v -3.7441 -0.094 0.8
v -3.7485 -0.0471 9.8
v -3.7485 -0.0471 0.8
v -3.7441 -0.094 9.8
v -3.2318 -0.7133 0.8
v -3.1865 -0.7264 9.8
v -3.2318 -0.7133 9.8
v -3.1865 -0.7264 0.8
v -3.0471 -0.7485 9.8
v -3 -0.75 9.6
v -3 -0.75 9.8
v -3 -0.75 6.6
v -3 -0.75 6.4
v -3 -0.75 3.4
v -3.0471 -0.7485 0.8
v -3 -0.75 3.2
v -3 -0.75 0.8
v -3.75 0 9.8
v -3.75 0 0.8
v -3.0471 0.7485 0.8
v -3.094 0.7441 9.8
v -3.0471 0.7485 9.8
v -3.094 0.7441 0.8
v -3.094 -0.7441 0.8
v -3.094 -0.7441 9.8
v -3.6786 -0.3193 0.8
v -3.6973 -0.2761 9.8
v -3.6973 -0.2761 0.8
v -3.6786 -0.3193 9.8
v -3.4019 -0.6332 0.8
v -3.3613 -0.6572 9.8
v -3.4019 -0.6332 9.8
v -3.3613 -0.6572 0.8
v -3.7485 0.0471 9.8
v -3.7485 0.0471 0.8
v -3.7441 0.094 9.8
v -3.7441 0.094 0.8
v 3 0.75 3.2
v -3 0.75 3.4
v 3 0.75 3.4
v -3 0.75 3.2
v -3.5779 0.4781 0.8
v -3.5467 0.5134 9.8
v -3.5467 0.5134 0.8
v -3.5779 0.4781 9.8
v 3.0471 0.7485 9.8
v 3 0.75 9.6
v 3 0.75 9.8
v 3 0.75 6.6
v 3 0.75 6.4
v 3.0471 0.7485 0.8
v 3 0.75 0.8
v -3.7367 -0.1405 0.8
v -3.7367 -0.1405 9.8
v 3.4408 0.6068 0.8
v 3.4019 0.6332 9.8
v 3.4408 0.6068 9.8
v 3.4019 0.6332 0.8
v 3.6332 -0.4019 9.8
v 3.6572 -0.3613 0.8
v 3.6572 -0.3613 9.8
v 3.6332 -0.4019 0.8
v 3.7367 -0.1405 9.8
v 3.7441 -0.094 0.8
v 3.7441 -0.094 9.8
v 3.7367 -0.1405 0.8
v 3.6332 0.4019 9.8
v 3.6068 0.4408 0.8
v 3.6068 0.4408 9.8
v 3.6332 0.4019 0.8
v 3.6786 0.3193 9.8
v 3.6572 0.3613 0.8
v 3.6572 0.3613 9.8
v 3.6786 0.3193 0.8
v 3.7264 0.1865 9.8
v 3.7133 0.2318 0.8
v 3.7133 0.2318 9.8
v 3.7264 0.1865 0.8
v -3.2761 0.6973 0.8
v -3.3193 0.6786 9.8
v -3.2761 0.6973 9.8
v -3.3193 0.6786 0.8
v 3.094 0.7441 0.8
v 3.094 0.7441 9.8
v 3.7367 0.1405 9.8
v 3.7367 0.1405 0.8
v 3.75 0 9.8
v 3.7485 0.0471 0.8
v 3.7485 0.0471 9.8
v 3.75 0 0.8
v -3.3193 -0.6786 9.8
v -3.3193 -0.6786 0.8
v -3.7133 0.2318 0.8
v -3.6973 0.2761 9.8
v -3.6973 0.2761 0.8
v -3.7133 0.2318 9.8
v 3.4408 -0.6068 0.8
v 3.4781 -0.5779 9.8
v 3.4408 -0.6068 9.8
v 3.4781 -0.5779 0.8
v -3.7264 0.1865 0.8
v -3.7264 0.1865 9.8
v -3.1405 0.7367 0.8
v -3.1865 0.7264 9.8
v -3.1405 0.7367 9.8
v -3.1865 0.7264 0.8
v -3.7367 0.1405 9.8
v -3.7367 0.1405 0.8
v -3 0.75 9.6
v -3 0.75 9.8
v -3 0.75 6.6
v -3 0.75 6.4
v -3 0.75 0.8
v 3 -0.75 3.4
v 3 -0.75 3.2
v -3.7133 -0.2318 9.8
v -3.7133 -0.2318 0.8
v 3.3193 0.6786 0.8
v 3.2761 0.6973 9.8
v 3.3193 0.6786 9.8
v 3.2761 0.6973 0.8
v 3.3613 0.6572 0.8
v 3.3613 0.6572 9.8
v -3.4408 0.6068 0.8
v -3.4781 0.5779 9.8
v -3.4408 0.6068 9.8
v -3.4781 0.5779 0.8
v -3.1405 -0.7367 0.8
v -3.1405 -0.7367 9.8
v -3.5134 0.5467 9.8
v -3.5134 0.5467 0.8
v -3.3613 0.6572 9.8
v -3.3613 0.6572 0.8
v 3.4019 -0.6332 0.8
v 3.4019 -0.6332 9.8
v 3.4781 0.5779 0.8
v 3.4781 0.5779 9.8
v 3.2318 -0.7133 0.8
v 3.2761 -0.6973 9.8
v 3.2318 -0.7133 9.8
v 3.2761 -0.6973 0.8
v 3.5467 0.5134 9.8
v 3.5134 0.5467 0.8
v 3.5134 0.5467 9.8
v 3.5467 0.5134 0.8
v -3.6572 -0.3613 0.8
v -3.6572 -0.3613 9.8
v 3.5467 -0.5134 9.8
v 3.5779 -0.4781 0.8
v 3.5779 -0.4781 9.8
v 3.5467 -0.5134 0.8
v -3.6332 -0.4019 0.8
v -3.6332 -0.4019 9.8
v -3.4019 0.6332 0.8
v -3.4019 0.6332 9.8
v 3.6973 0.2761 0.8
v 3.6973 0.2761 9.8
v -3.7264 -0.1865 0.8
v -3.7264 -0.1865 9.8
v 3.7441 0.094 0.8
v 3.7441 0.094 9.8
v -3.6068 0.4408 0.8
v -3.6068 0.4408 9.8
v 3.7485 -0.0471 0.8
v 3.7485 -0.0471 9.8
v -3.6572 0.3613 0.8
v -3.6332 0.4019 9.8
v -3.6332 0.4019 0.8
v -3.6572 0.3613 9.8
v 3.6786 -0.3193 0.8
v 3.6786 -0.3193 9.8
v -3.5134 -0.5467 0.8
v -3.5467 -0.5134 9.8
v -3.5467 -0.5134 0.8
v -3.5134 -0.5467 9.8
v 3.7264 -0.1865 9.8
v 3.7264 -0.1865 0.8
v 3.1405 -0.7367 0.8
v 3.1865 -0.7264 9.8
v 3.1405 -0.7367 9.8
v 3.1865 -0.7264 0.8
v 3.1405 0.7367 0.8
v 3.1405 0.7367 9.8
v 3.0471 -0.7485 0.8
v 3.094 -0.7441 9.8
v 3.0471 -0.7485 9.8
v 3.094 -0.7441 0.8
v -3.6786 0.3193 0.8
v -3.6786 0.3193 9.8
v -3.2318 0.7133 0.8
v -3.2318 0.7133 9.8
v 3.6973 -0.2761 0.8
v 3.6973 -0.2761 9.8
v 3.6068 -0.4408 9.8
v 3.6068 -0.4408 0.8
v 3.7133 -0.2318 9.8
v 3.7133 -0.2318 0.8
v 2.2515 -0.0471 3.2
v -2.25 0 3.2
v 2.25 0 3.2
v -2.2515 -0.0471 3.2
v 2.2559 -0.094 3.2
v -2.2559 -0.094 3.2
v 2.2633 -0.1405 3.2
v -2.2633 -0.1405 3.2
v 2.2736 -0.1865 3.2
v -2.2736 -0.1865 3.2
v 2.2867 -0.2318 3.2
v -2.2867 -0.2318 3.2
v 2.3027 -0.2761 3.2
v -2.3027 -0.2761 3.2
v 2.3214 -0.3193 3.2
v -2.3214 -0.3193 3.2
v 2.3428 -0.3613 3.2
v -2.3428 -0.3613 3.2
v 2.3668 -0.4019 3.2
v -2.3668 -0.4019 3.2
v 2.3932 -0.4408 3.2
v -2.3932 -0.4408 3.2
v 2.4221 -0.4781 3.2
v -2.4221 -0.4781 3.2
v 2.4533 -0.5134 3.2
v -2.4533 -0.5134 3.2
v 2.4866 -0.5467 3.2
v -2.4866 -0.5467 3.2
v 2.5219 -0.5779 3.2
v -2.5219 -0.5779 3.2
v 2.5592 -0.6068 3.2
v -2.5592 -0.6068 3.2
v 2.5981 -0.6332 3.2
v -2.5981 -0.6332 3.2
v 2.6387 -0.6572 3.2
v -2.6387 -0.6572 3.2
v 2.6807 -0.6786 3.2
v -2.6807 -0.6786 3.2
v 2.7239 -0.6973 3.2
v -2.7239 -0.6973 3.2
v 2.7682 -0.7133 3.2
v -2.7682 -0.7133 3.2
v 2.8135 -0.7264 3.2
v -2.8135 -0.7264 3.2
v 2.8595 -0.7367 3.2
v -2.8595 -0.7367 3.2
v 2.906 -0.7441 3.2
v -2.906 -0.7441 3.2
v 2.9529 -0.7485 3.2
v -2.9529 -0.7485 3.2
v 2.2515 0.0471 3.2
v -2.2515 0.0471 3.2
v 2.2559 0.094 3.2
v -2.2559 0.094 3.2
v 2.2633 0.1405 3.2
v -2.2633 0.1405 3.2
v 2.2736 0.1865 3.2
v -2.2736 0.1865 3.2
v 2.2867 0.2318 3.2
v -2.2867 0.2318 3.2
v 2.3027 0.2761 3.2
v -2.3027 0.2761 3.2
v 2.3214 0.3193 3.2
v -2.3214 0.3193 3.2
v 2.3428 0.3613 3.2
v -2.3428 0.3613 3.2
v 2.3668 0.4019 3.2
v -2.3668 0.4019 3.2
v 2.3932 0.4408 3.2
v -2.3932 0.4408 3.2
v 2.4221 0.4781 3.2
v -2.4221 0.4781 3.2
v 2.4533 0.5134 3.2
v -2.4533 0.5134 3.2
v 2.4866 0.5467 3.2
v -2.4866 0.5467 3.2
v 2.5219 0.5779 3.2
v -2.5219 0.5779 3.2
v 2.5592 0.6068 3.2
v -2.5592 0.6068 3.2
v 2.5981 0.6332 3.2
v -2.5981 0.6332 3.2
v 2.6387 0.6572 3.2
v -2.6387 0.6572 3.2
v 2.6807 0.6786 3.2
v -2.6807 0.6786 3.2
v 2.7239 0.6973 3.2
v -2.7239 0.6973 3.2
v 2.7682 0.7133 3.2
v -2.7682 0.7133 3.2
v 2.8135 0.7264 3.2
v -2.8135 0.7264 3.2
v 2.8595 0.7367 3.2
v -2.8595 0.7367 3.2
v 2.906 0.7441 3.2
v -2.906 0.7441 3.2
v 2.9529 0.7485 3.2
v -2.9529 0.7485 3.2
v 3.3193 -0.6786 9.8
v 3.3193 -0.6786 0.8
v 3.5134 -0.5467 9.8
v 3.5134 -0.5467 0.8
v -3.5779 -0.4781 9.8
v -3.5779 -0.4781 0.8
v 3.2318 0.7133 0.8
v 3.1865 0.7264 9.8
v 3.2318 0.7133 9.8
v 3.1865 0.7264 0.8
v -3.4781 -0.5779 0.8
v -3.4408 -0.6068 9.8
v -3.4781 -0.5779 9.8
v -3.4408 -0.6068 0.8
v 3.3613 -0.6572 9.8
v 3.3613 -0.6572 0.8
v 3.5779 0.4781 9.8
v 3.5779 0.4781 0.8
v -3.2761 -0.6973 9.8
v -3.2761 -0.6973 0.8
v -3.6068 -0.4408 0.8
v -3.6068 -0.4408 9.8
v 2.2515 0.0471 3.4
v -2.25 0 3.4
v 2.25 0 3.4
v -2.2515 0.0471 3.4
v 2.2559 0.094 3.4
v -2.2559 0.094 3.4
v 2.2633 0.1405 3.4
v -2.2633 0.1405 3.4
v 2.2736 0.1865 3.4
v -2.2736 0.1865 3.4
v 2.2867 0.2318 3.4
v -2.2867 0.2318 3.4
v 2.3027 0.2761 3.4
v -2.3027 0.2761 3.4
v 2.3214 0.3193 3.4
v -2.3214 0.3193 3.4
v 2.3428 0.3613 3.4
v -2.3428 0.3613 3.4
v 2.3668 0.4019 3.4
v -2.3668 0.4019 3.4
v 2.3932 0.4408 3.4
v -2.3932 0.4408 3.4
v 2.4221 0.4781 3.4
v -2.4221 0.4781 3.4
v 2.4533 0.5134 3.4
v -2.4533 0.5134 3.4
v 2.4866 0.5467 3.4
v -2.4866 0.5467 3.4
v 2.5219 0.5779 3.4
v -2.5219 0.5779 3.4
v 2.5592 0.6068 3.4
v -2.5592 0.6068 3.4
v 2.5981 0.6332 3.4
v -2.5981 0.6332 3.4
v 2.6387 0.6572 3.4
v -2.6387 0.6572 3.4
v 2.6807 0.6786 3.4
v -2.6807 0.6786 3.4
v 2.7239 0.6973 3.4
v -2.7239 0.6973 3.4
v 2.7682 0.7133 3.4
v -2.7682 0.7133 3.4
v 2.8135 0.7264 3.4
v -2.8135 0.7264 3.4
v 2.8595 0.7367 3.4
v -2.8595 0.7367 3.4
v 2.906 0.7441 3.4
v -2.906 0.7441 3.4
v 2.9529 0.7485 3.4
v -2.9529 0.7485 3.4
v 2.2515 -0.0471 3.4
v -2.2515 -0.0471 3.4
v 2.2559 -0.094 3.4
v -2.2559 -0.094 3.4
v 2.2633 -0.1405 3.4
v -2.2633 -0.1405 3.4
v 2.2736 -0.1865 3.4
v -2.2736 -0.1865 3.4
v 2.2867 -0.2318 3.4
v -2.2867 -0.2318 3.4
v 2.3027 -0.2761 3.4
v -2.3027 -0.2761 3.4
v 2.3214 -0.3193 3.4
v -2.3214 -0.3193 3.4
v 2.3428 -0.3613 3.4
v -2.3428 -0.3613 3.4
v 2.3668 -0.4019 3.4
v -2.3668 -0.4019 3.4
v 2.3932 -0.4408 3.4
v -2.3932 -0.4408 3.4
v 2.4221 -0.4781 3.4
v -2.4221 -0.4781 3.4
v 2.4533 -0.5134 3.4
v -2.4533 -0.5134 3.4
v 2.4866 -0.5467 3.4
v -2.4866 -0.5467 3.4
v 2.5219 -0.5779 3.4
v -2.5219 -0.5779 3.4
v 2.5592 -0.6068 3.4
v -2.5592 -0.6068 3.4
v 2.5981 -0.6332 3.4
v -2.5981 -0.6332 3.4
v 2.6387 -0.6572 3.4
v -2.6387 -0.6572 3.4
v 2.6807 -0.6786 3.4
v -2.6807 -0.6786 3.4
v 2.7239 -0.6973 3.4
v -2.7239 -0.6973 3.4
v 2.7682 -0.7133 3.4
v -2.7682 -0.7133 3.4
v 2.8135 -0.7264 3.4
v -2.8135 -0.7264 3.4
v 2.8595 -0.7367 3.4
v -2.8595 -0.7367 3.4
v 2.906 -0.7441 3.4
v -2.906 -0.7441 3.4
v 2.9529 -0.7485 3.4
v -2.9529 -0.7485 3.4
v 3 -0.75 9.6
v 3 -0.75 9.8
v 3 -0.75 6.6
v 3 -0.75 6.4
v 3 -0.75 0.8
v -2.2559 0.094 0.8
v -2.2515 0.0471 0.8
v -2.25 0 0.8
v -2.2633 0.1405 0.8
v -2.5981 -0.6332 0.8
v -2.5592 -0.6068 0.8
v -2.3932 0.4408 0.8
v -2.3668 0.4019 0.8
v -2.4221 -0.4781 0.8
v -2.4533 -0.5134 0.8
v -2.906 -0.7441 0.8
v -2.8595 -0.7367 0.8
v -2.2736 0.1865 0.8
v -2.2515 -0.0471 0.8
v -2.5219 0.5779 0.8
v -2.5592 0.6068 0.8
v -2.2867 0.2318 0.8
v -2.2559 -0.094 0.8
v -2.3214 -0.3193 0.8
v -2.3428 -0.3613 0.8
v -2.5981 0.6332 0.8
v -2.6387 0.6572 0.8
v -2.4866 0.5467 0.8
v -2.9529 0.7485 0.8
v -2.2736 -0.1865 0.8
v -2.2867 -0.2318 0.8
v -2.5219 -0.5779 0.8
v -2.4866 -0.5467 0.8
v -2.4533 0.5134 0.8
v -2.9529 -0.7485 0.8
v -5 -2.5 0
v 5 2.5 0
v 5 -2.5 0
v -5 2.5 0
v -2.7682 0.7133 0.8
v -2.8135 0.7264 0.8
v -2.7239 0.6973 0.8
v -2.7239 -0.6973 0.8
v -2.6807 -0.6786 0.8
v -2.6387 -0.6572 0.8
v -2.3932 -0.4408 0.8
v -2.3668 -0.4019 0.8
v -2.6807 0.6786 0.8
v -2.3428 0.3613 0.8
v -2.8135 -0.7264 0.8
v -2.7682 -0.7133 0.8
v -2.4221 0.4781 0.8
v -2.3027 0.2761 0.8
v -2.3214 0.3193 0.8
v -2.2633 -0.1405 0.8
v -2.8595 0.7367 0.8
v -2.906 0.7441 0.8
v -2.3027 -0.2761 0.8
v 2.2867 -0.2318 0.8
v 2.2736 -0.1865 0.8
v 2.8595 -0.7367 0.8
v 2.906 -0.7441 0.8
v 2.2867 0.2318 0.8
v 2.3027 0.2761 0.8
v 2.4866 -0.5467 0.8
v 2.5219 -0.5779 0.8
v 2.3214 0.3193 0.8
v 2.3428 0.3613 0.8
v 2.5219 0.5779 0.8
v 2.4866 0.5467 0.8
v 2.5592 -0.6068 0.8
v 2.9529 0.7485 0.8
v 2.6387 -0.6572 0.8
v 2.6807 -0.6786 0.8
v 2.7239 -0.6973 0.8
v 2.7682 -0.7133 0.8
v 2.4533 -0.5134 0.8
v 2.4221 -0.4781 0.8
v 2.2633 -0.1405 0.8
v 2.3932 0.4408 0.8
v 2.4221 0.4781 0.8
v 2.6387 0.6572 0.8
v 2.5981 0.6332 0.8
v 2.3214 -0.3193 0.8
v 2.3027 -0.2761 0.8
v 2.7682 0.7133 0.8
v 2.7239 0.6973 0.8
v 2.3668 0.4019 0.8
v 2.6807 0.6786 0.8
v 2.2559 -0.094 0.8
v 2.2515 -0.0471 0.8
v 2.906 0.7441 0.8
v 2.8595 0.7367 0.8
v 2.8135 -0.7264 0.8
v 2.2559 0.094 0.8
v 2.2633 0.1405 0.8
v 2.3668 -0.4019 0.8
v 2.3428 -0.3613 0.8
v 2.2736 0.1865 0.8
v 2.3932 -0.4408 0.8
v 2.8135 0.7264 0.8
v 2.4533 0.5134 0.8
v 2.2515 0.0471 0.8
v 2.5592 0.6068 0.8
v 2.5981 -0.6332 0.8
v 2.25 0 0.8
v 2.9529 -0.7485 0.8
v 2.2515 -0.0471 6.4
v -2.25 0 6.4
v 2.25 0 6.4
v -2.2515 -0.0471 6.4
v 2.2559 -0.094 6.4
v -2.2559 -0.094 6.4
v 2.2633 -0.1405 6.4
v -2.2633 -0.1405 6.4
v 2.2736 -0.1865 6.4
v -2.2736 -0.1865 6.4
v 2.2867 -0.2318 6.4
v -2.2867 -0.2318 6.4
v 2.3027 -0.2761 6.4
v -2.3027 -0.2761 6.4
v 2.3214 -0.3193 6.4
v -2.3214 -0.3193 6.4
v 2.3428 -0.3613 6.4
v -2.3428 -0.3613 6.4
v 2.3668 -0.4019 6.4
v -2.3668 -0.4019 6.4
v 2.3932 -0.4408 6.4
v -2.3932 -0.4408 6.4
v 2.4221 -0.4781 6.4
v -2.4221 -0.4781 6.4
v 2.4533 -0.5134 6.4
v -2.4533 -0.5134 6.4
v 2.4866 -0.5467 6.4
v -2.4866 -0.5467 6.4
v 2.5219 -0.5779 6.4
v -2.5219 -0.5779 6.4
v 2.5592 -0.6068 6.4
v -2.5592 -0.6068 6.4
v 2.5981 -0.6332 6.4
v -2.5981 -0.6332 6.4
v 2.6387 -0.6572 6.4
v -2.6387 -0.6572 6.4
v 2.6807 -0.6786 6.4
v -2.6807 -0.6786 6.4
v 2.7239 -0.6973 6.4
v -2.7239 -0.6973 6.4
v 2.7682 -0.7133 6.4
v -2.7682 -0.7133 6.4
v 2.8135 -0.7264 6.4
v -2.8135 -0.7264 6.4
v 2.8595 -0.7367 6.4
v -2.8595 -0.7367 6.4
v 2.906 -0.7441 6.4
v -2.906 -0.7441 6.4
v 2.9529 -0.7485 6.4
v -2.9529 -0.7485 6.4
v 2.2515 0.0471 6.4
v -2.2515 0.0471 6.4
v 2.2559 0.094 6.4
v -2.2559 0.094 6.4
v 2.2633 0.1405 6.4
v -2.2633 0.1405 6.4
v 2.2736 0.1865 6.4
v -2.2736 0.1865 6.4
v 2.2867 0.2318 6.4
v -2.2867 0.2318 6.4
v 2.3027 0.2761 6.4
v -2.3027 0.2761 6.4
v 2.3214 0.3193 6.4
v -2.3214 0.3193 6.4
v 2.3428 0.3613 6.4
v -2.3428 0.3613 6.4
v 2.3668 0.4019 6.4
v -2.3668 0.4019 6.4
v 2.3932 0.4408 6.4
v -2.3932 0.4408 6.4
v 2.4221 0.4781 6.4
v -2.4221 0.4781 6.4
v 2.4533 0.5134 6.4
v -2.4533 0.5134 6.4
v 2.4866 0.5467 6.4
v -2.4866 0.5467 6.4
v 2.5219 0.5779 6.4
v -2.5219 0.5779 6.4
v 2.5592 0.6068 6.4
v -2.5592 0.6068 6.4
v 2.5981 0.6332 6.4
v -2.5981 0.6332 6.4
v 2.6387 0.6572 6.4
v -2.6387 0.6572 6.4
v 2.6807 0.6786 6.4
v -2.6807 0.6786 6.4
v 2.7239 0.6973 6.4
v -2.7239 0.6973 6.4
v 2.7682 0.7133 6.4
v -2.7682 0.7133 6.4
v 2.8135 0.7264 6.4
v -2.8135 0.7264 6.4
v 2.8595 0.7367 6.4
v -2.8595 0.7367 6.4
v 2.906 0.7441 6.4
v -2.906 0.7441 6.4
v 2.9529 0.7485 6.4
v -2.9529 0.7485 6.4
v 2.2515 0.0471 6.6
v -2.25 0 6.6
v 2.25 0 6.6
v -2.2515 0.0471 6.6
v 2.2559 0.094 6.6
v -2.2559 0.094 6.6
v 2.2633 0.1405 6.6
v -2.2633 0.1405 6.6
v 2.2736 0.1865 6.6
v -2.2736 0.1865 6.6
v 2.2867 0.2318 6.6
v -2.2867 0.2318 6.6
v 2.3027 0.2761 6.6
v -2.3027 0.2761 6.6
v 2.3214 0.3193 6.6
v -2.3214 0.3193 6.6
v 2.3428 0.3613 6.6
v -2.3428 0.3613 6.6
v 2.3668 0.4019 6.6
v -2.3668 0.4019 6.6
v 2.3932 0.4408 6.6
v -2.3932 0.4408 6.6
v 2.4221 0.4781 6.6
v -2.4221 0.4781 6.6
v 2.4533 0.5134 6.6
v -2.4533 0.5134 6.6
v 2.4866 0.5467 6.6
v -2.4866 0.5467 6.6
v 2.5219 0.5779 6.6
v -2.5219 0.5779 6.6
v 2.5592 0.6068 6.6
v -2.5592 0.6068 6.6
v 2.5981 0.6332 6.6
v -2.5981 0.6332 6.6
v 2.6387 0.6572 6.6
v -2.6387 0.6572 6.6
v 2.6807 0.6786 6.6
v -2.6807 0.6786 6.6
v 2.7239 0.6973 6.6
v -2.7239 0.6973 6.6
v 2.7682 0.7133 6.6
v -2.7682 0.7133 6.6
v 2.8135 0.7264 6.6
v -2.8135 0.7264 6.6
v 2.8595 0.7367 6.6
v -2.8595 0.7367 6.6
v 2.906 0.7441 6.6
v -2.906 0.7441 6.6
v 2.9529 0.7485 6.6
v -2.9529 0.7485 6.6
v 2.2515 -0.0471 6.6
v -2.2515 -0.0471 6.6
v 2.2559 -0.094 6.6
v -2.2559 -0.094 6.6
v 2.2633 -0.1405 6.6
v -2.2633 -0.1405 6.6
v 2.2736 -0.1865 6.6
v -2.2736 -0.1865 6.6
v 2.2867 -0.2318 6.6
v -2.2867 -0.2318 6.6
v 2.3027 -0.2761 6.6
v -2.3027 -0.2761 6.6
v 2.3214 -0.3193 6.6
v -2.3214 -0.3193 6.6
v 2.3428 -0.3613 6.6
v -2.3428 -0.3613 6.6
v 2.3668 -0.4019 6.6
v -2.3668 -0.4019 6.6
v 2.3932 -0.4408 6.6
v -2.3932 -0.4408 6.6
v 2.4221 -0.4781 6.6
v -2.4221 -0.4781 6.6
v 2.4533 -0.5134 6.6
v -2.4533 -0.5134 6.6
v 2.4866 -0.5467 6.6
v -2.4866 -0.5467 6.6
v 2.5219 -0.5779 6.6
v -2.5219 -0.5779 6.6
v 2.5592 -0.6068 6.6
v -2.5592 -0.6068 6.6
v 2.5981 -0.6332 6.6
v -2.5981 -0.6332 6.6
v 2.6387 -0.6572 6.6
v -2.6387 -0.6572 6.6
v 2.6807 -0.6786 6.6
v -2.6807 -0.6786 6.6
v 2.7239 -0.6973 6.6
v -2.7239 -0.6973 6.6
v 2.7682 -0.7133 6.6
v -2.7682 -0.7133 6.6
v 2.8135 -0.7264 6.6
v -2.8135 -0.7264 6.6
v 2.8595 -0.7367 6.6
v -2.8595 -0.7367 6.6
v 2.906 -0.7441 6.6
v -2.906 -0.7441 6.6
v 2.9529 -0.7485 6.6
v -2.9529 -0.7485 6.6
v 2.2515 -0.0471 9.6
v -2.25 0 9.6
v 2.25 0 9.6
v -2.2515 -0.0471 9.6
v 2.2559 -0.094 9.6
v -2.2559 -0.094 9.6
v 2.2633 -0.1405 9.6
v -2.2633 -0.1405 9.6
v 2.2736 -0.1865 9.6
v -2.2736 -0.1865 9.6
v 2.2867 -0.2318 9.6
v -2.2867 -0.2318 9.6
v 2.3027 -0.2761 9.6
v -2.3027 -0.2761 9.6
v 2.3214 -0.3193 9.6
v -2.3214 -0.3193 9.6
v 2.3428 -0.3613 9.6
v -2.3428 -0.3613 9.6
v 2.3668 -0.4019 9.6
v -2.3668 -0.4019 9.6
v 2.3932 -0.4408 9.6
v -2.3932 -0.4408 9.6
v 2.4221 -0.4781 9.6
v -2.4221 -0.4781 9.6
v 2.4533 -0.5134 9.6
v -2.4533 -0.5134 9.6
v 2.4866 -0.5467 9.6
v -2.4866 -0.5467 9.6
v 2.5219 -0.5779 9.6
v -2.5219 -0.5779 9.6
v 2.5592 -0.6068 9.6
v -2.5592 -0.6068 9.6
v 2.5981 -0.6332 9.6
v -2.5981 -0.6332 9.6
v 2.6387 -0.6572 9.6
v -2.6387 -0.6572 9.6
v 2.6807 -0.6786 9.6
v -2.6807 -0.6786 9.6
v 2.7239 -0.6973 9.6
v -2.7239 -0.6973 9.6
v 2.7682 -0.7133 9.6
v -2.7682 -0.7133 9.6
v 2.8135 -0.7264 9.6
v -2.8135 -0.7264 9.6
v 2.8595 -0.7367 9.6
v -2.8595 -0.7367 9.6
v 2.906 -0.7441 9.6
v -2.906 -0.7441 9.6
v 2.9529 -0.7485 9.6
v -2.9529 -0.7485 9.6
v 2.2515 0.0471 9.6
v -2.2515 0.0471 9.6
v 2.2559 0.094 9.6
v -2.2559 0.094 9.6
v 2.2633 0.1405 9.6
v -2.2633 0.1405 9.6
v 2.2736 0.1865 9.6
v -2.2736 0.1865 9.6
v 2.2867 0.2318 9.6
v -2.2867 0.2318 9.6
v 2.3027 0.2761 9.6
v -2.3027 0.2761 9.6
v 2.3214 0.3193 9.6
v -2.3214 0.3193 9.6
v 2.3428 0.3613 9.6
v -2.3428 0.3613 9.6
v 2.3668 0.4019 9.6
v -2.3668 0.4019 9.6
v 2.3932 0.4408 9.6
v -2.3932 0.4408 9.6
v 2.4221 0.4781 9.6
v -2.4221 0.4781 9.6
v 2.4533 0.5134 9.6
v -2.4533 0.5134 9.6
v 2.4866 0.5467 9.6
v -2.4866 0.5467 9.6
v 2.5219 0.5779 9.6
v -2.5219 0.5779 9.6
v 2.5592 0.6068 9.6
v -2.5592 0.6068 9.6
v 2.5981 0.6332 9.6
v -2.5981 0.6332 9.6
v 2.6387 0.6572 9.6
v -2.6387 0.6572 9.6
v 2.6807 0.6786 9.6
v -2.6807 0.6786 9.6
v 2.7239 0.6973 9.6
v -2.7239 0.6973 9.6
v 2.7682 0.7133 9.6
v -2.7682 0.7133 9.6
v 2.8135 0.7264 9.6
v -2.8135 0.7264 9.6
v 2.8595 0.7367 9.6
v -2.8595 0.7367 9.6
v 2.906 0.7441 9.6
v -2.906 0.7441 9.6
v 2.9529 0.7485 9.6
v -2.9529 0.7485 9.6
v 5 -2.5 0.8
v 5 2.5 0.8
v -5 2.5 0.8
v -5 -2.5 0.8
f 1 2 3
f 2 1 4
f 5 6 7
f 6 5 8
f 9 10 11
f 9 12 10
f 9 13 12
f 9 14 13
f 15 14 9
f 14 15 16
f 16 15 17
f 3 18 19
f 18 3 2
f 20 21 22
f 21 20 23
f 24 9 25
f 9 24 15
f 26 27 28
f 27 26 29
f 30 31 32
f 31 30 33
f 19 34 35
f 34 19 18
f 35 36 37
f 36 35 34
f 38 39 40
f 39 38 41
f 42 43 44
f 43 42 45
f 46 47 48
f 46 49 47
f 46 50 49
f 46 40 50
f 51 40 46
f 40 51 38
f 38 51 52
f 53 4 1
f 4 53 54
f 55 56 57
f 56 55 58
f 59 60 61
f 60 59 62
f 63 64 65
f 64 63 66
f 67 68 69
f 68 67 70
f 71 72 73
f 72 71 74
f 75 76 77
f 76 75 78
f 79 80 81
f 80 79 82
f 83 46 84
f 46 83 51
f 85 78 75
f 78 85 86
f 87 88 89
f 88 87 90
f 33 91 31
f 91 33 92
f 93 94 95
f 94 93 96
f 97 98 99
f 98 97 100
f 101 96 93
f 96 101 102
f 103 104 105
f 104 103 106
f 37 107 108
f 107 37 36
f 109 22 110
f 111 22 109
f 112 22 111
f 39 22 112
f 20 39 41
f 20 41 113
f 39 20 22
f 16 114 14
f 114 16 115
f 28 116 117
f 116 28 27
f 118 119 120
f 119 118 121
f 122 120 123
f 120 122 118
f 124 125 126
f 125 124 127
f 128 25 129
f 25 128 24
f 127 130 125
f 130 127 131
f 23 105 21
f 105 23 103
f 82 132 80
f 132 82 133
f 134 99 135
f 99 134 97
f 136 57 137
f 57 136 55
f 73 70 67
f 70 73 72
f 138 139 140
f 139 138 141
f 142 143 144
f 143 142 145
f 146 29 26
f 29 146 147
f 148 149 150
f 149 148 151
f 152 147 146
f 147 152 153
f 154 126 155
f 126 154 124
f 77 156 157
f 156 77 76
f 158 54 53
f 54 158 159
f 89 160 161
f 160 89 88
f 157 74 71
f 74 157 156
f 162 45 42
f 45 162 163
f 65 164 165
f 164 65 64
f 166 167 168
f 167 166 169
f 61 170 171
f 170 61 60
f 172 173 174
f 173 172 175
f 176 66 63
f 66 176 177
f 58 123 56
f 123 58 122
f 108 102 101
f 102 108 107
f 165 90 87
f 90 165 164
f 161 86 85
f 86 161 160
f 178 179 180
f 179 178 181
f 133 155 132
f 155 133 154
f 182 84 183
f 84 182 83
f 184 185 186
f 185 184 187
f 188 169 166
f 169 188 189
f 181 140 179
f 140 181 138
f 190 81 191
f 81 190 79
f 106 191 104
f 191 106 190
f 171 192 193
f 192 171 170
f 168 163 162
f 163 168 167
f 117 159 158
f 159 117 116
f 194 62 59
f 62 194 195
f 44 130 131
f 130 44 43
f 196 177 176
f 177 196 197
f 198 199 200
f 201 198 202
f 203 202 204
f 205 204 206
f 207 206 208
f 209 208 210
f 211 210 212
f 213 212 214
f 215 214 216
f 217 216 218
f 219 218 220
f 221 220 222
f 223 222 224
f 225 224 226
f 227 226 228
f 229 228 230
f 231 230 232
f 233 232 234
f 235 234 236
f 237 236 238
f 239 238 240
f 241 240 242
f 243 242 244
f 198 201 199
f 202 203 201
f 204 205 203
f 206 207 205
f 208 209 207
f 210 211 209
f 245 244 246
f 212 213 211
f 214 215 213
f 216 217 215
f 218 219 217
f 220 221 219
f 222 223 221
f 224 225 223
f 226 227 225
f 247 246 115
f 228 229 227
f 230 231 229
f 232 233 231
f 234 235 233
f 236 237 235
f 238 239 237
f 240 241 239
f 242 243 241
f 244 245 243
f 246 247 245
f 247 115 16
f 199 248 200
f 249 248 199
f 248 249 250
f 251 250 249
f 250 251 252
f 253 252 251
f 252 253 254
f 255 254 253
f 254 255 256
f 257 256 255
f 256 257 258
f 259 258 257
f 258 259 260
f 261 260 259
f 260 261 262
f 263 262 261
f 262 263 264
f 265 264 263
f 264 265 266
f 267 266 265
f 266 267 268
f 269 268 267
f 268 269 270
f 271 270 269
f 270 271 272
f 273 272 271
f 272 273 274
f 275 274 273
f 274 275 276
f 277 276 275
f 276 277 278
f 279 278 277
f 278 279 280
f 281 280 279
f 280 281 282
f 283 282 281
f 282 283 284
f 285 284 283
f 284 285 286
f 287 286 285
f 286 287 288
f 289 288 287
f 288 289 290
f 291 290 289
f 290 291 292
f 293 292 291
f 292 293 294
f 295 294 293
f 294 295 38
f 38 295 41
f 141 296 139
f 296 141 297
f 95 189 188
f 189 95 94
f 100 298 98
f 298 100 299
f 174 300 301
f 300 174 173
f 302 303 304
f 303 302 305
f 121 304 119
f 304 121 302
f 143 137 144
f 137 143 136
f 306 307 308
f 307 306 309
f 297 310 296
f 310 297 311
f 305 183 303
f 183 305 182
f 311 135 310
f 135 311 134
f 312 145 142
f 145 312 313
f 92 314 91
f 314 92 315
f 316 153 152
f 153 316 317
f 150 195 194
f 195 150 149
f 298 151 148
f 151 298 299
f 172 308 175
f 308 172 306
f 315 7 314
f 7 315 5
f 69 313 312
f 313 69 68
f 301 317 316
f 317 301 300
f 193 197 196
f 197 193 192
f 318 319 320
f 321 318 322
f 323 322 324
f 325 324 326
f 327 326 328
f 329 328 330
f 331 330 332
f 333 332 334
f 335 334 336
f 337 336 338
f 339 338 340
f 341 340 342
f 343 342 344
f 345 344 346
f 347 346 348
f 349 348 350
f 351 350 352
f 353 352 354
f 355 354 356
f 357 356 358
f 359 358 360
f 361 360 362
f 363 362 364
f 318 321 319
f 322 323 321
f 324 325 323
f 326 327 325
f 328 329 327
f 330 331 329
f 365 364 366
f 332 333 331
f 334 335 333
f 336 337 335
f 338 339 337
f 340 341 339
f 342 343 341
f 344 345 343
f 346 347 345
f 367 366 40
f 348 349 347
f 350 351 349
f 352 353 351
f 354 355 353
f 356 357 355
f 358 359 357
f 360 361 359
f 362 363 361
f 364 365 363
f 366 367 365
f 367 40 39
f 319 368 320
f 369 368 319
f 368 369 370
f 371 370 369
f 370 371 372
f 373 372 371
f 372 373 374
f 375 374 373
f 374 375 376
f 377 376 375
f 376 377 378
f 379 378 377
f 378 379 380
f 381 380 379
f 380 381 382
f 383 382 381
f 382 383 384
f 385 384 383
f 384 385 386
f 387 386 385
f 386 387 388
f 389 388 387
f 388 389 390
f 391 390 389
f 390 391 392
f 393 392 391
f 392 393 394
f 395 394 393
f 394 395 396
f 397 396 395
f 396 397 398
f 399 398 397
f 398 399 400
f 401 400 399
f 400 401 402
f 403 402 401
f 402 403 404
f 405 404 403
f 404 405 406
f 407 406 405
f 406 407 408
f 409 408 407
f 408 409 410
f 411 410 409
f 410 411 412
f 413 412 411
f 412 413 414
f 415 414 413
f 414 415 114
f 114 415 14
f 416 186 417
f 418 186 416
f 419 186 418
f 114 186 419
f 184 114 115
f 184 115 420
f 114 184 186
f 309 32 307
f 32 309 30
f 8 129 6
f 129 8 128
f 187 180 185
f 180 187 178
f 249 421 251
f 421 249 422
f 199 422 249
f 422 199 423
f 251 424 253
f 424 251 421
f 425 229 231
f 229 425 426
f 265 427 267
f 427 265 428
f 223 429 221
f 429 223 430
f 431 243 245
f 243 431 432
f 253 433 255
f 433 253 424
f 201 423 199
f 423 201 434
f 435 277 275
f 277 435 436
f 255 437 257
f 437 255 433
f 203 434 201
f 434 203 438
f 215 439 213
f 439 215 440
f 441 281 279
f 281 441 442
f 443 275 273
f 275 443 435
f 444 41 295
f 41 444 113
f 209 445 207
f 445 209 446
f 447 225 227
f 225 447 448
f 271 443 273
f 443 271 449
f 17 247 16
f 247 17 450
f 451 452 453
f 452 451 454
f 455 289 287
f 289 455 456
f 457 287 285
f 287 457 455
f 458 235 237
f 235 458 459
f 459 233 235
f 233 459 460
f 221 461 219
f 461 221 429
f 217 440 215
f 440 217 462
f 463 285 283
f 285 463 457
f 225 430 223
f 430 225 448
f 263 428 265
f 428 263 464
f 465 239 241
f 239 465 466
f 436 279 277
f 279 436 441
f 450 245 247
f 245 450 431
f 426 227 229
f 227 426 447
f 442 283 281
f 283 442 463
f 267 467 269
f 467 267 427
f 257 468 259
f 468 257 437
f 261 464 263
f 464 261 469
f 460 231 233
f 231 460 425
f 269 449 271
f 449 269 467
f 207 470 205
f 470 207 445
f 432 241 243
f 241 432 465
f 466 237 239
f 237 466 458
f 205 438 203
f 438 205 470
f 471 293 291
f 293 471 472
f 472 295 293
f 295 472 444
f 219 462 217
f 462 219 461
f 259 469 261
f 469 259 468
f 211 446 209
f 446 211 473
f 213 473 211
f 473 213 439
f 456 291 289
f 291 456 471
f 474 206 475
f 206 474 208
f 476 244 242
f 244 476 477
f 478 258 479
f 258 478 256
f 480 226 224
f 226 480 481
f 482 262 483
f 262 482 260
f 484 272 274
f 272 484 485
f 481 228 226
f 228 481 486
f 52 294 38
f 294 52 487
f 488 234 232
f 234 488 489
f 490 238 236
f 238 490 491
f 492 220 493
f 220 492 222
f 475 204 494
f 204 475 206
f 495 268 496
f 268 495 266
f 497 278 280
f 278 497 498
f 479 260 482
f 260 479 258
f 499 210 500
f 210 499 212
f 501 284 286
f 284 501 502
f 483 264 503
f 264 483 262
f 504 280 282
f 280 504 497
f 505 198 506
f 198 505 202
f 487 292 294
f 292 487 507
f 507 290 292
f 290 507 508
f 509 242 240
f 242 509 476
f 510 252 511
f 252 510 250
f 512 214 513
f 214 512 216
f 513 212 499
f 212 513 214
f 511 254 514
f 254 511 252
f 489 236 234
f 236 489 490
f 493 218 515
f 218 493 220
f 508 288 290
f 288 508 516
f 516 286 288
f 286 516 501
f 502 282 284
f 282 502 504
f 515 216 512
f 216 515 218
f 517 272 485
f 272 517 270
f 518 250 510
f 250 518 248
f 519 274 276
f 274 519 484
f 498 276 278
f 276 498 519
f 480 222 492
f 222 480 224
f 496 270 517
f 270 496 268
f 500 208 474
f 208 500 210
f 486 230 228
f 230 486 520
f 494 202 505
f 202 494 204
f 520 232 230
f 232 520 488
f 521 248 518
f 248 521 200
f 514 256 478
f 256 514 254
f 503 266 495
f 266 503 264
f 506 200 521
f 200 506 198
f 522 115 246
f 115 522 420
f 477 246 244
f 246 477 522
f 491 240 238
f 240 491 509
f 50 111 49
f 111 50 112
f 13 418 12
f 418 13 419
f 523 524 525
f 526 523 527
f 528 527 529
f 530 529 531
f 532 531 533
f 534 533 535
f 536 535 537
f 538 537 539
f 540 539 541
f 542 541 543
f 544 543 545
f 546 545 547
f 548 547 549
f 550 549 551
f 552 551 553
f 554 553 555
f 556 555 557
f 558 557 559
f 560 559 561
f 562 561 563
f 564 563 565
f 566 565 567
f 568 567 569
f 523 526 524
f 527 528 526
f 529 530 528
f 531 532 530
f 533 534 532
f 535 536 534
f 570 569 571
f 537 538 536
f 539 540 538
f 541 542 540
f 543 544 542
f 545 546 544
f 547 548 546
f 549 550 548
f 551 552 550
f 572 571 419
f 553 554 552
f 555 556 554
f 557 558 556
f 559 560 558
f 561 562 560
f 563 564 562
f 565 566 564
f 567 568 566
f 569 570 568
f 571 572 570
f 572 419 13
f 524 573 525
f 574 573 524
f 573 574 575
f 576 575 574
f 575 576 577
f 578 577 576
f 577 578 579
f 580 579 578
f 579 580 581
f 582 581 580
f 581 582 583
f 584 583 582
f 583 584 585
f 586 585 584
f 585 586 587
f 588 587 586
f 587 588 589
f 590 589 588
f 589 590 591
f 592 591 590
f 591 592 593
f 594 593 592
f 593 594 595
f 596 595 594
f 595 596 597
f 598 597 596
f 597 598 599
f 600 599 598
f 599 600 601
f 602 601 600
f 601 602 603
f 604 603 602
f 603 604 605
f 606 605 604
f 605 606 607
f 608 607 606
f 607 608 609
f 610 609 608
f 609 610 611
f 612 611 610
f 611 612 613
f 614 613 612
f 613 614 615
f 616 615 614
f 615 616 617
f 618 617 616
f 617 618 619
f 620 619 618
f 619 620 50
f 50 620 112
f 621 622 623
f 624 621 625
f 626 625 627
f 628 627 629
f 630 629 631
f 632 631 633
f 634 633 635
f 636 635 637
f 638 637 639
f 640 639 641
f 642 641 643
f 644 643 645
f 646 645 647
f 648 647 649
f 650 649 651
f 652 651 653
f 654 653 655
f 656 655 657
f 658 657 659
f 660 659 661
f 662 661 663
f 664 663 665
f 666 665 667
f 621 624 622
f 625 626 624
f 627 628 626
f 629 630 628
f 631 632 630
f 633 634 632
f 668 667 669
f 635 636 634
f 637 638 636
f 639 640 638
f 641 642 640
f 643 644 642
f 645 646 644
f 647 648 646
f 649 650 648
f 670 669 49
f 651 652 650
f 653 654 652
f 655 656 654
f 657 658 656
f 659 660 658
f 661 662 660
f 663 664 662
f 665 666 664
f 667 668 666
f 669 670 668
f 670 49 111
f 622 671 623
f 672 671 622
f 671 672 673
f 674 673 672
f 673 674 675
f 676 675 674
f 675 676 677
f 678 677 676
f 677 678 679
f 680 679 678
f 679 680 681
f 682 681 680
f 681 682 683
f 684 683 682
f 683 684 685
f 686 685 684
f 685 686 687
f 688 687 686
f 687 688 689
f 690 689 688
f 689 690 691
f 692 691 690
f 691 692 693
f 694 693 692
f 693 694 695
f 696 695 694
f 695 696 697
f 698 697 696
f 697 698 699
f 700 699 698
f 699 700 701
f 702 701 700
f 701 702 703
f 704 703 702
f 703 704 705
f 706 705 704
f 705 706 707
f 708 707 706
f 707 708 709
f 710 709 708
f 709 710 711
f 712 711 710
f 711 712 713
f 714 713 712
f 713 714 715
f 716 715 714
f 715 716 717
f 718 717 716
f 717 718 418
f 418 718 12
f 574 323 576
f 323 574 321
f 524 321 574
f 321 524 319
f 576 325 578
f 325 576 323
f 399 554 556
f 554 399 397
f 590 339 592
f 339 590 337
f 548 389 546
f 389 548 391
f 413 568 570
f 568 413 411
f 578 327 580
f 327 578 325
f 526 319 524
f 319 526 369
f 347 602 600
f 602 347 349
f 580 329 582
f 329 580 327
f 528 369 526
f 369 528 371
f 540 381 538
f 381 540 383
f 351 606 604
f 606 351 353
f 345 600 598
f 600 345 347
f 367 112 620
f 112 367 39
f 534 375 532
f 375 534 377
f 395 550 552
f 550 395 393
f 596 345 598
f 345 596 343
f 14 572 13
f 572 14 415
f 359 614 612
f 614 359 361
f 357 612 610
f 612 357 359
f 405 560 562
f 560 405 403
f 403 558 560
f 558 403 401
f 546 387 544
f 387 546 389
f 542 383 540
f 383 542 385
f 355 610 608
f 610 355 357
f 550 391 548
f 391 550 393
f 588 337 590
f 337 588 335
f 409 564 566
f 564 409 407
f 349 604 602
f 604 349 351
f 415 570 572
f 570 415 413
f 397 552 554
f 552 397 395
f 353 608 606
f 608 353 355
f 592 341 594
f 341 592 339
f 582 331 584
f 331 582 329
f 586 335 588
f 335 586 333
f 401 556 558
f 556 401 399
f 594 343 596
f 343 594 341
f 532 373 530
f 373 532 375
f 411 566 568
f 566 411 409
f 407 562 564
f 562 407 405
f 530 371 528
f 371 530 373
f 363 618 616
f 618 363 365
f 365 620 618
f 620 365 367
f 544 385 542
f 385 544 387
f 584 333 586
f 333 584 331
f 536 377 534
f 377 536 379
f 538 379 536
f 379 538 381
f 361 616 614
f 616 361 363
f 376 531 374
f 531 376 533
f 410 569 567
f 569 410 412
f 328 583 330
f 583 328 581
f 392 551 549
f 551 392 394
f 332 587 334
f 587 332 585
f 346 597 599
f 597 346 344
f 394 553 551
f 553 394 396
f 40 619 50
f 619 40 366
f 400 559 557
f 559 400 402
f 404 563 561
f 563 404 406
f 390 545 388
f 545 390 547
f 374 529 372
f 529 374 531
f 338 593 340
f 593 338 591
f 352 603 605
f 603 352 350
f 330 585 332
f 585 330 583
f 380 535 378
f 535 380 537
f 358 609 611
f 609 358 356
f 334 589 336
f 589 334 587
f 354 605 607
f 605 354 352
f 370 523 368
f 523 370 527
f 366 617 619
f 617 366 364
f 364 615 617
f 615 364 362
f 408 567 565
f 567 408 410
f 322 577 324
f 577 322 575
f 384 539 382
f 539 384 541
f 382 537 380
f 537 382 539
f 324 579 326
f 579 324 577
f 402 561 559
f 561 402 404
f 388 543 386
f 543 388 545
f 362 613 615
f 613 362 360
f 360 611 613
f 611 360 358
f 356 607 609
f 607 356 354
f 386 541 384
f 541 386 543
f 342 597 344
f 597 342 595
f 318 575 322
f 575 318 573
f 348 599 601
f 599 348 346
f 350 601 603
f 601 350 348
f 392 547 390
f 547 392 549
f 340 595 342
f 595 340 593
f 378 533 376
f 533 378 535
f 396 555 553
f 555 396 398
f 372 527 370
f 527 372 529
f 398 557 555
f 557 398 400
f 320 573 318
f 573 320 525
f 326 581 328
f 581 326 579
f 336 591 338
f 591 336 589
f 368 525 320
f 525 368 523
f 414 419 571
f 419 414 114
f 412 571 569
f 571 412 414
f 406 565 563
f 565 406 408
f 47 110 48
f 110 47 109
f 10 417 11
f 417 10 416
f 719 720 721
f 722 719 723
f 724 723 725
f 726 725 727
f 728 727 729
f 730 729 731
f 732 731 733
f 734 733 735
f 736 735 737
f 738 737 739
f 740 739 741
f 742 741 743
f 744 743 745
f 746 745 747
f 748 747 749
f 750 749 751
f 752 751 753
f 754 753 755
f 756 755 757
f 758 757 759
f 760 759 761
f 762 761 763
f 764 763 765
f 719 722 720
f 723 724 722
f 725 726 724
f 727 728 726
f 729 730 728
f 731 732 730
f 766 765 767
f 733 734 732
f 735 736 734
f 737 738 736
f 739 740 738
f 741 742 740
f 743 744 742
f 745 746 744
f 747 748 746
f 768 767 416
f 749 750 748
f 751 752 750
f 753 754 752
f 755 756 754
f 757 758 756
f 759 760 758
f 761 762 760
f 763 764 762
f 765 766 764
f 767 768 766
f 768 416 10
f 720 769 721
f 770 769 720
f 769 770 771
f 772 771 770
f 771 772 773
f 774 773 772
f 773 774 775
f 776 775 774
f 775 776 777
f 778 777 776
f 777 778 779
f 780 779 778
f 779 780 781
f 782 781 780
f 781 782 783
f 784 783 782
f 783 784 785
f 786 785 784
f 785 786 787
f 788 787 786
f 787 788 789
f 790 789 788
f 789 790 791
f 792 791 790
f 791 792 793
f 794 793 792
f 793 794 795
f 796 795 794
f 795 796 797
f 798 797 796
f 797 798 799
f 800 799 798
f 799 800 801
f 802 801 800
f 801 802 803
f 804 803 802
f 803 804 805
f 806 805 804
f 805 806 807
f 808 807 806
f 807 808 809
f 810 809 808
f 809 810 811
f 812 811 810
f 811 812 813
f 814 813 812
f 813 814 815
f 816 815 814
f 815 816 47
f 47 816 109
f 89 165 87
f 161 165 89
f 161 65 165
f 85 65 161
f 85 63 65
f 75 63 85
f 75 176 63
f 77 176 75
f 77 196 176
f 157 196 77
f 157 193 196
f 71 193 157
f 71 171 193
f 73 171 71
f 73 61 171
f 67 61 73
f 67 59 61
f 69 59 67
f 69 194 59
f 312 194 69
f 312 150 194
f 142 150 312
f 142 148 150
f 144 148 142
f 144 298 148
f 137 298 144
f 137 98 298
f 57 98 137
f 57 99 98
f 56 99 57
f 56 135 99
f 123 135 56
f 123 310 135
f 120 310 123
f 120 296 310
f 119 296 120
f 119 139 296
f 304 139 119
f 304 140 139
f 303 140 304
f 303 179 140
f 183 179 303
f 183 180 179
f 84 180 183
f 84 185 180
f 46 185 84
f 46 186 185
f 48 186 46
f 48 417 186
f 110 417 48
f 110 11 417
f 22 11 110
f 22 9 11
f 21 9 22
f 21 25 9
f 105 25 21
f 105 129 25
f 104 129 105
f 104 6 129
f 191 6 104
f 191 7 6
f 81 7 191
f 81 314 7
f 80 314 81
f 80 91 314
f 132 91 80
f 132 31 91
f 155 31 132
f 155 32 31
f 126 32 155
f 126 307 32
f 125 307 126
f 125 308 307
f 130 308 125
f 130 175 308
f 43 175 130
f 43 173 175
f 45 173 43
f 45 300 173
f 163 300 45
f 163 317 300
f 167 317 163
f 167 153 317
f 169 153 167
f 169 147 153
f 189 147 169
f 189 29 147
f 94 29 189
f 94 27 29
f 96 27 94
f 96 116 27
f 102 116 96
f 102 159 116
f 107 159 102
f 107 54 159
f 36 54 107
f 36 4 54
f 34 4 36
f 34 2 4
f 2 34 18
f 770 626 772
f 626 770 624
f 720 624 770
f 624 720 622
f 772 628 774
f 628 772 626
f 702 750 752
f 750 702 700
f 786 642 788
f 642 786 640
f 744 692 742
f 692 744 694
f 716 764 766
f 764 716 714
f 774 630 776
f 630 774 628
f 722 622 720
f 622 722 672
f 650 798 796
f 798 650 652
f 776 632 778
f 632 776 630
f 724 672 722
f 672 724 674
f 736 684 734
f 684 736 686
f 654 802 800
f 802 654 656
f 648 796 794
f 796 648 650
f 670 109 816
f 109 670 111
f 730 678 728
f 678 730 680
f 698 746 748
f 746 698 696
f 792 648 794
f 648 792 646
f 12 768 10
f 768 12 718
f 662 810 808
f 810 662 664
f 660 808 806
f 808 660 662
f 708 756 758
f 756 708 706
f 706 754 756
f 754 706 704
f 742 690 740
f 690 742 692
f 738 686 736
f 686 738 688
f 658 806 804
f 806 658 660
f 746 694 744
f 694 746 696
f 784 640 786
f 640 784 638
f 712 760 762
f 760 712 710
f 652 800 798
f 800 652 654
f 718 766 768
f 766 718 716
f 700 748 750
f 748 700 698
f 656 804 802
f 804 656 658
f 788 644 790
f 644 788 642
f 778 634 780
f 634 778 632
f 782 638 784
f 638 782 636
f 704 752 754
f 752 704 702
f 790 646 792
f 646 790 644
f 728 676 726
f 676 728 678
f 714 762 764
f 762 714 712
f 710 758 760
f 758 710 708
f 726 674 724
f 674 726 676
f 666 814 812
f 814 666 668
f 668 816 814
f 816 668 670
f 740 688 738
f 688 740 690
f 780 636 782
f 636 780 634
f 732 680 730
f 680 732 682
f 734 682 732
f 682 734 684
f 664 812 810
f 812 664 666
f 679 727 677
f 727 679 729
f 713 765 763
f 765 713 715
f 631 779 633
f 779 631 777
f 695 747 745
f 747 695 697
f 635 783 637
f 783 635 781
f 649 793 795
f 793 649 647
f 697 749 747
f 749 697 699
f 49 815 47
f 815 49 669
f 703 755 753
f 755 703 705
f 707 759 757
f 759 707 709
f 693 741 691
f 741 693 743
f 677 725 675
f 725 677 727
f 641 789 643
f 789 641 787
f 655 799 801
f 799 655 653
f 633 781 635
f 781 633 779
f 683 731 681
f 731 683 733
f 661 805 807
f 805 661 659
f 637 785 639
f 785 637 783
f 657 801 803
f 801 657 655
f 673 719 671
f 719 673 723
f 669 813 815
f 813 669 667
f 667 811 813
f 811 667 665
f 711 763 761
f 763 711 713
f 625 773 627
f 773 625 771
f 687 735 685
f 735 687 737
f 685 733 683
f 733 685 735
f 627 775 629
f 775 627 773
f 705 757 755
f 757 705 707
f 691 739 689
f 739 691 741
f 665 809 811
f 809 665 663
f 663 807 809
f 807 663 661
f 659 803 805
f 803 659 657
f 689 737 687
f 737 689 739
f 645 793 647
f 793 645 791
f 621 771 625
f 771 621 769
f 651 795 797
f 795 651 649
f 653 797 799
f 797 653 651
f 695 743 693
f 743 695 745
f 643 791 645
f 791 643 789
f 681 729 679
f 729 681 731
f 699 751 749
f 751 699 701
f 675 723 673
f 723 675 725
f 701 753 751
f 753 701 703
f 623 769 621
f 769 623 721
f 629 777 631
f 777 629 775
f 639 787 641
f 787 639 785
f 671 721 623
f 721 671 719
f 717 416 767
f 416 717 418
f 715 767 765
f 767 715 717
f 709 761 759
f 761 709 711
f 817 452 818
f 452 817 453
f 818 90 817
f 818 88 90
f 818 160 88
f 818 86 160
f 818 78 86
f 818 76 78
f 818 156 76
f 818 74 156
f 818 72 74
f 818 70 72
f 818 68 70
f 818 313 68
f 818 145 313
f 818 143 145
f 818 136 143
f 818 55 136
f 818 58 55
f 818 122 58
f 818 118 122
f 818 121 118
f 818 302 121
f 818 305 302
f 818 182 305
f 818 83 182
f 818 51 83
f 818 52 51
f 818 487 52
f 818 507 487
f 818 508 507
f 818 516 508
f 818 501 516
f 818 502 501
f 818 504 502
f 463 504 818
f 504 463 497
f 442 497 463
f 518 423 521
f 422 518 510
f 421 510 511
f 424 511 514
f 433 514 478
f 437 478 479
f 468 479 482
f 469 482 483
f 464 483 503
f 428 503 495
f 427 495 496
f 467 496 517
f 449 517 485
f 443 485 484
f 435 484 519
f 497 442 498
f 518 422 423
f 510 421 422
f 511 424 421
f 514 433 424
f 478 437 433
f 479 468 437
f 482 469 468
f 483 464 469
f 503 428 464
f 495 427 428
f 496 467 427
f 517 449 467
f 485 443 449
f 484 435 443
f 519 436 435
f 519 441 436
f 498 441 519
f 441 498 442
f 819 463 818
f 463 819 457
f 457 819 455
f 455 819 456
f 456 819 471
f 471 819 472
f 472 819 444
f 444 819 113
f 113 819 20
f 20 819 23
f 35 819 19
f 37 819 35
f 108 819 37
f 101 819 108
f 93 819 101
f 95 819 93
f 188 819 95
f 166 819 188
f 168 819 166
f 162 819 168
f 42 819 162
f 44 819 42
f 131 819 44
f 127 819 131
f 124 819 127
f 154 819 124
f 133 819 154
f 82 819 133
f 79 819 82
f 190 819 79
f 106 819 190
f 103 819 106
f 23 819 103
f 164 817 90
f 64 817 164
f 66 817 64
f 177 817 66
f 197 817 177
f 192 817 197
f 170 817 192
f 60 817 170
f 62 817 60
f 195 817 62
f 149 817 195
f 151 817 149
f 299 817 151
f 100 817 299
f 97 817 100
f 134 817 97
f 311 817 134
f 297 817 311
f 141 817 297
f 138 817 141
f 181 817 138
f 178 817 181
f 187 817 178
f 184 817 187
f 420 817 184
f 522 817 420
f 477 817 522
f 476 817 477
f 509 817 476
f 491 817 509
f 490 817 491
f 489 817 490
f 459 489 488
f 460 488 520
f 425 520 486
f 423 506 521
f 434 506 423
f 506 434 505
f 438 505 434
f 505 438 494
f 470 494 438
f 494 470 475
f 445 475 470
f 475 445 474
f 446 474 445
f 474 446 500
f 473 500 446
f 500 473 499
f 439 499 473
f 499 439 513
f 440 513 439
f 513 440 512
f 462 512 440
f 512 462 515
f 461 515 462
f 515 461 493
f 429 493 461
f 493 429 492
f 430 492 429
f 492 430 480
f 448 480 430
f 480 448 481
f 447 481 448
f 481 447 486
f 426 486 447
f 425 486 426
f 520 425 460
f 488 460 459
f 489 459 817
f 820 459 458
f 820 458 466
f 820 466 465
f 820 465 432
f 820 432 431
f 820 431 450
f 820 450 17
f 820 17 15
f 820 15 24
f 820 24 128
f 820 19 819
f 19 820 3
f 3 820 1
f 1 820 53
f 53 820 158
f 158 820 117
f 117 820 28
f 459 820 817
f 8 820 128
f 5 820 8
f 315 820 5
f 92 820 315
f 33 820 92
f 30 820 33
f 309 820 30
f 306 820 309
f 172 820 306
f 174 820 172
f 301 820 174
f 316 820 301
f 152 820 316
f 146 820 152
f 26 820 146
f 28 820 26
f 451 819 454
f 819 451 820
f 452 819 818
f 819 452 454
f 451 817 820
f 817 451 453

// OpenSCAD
$fn = 100;

// make sure klipper config has the `firmware_retraction` enabled
// and the slicer is using G10/G11 correctly

// ref: https://www.klipper3d.org/G-Codes.html#tuning_tower_1

// TUNING_TOWER COMMAND=SET_RETRACTION PARAMETER=RETRACT_LENGTH SKIP=3.2 STEP_HEIGHT=3.2 START=0 STEP_DELTA=0.2
// TUNING_TOWER COMMAND=SET_RETRACTION PARAMETER=RETRACT_SPEED SKIP=3.2 STEP_HEIGHT=3.2 START=20 STEP_DELTA=5
// TUNING_TOWER COMMAND=SET_RETRACTION PARAMETER=UNRETRACT_EXTRA_LENGTH SKIP=3.2 STEP_HEIGHT=3.2 START=0 STEP_DELTA=0.01
// TUNING_TOWER COMMAND=SET_RETRACTION PARAMETER=UNRETRACT_SPEED SKIP=3.2 STEP_HEIGHT=3.2 START=10 STEP_DELTA=5

SKIP = 3.2;
STEP_HEIGHT = 3.2;

change_num_steps = 2;
base_height_mm = 0.8;
column_distance_mm = 6;
column_diameter_mm = 1.5;

module section(diameter = column_diameter_mm, width = column_distance_mm, height, thickness = 0.2) union()
{
    radius = diameter / 2;
    x_offset = width / 2;

    translate([ 0, 0, height ]) linear_extrude(thickness) hull()
    {
        translate([ -x_offset, 0 ]) circle(r = radius);
        translate([ x_offset, 0 ]) circle(r = radius);
    }

    translate([ -x_offset, 0 ]) cylinder(r = radius, h = height);
    translate([ x_offset, 0 ]) cylinder(r = radius, h = height);
}

translate([ -5, -2.5 ]) cube([ 10, 5, base_height_mm ]);

// warmup section
section(height = SKIP);

for (step = [0:change_num_steps - 1])
    translate([ 0, 0, step *STEP_HEIGHT + SKIP ]) section(height = STEP_HEIGHT);
